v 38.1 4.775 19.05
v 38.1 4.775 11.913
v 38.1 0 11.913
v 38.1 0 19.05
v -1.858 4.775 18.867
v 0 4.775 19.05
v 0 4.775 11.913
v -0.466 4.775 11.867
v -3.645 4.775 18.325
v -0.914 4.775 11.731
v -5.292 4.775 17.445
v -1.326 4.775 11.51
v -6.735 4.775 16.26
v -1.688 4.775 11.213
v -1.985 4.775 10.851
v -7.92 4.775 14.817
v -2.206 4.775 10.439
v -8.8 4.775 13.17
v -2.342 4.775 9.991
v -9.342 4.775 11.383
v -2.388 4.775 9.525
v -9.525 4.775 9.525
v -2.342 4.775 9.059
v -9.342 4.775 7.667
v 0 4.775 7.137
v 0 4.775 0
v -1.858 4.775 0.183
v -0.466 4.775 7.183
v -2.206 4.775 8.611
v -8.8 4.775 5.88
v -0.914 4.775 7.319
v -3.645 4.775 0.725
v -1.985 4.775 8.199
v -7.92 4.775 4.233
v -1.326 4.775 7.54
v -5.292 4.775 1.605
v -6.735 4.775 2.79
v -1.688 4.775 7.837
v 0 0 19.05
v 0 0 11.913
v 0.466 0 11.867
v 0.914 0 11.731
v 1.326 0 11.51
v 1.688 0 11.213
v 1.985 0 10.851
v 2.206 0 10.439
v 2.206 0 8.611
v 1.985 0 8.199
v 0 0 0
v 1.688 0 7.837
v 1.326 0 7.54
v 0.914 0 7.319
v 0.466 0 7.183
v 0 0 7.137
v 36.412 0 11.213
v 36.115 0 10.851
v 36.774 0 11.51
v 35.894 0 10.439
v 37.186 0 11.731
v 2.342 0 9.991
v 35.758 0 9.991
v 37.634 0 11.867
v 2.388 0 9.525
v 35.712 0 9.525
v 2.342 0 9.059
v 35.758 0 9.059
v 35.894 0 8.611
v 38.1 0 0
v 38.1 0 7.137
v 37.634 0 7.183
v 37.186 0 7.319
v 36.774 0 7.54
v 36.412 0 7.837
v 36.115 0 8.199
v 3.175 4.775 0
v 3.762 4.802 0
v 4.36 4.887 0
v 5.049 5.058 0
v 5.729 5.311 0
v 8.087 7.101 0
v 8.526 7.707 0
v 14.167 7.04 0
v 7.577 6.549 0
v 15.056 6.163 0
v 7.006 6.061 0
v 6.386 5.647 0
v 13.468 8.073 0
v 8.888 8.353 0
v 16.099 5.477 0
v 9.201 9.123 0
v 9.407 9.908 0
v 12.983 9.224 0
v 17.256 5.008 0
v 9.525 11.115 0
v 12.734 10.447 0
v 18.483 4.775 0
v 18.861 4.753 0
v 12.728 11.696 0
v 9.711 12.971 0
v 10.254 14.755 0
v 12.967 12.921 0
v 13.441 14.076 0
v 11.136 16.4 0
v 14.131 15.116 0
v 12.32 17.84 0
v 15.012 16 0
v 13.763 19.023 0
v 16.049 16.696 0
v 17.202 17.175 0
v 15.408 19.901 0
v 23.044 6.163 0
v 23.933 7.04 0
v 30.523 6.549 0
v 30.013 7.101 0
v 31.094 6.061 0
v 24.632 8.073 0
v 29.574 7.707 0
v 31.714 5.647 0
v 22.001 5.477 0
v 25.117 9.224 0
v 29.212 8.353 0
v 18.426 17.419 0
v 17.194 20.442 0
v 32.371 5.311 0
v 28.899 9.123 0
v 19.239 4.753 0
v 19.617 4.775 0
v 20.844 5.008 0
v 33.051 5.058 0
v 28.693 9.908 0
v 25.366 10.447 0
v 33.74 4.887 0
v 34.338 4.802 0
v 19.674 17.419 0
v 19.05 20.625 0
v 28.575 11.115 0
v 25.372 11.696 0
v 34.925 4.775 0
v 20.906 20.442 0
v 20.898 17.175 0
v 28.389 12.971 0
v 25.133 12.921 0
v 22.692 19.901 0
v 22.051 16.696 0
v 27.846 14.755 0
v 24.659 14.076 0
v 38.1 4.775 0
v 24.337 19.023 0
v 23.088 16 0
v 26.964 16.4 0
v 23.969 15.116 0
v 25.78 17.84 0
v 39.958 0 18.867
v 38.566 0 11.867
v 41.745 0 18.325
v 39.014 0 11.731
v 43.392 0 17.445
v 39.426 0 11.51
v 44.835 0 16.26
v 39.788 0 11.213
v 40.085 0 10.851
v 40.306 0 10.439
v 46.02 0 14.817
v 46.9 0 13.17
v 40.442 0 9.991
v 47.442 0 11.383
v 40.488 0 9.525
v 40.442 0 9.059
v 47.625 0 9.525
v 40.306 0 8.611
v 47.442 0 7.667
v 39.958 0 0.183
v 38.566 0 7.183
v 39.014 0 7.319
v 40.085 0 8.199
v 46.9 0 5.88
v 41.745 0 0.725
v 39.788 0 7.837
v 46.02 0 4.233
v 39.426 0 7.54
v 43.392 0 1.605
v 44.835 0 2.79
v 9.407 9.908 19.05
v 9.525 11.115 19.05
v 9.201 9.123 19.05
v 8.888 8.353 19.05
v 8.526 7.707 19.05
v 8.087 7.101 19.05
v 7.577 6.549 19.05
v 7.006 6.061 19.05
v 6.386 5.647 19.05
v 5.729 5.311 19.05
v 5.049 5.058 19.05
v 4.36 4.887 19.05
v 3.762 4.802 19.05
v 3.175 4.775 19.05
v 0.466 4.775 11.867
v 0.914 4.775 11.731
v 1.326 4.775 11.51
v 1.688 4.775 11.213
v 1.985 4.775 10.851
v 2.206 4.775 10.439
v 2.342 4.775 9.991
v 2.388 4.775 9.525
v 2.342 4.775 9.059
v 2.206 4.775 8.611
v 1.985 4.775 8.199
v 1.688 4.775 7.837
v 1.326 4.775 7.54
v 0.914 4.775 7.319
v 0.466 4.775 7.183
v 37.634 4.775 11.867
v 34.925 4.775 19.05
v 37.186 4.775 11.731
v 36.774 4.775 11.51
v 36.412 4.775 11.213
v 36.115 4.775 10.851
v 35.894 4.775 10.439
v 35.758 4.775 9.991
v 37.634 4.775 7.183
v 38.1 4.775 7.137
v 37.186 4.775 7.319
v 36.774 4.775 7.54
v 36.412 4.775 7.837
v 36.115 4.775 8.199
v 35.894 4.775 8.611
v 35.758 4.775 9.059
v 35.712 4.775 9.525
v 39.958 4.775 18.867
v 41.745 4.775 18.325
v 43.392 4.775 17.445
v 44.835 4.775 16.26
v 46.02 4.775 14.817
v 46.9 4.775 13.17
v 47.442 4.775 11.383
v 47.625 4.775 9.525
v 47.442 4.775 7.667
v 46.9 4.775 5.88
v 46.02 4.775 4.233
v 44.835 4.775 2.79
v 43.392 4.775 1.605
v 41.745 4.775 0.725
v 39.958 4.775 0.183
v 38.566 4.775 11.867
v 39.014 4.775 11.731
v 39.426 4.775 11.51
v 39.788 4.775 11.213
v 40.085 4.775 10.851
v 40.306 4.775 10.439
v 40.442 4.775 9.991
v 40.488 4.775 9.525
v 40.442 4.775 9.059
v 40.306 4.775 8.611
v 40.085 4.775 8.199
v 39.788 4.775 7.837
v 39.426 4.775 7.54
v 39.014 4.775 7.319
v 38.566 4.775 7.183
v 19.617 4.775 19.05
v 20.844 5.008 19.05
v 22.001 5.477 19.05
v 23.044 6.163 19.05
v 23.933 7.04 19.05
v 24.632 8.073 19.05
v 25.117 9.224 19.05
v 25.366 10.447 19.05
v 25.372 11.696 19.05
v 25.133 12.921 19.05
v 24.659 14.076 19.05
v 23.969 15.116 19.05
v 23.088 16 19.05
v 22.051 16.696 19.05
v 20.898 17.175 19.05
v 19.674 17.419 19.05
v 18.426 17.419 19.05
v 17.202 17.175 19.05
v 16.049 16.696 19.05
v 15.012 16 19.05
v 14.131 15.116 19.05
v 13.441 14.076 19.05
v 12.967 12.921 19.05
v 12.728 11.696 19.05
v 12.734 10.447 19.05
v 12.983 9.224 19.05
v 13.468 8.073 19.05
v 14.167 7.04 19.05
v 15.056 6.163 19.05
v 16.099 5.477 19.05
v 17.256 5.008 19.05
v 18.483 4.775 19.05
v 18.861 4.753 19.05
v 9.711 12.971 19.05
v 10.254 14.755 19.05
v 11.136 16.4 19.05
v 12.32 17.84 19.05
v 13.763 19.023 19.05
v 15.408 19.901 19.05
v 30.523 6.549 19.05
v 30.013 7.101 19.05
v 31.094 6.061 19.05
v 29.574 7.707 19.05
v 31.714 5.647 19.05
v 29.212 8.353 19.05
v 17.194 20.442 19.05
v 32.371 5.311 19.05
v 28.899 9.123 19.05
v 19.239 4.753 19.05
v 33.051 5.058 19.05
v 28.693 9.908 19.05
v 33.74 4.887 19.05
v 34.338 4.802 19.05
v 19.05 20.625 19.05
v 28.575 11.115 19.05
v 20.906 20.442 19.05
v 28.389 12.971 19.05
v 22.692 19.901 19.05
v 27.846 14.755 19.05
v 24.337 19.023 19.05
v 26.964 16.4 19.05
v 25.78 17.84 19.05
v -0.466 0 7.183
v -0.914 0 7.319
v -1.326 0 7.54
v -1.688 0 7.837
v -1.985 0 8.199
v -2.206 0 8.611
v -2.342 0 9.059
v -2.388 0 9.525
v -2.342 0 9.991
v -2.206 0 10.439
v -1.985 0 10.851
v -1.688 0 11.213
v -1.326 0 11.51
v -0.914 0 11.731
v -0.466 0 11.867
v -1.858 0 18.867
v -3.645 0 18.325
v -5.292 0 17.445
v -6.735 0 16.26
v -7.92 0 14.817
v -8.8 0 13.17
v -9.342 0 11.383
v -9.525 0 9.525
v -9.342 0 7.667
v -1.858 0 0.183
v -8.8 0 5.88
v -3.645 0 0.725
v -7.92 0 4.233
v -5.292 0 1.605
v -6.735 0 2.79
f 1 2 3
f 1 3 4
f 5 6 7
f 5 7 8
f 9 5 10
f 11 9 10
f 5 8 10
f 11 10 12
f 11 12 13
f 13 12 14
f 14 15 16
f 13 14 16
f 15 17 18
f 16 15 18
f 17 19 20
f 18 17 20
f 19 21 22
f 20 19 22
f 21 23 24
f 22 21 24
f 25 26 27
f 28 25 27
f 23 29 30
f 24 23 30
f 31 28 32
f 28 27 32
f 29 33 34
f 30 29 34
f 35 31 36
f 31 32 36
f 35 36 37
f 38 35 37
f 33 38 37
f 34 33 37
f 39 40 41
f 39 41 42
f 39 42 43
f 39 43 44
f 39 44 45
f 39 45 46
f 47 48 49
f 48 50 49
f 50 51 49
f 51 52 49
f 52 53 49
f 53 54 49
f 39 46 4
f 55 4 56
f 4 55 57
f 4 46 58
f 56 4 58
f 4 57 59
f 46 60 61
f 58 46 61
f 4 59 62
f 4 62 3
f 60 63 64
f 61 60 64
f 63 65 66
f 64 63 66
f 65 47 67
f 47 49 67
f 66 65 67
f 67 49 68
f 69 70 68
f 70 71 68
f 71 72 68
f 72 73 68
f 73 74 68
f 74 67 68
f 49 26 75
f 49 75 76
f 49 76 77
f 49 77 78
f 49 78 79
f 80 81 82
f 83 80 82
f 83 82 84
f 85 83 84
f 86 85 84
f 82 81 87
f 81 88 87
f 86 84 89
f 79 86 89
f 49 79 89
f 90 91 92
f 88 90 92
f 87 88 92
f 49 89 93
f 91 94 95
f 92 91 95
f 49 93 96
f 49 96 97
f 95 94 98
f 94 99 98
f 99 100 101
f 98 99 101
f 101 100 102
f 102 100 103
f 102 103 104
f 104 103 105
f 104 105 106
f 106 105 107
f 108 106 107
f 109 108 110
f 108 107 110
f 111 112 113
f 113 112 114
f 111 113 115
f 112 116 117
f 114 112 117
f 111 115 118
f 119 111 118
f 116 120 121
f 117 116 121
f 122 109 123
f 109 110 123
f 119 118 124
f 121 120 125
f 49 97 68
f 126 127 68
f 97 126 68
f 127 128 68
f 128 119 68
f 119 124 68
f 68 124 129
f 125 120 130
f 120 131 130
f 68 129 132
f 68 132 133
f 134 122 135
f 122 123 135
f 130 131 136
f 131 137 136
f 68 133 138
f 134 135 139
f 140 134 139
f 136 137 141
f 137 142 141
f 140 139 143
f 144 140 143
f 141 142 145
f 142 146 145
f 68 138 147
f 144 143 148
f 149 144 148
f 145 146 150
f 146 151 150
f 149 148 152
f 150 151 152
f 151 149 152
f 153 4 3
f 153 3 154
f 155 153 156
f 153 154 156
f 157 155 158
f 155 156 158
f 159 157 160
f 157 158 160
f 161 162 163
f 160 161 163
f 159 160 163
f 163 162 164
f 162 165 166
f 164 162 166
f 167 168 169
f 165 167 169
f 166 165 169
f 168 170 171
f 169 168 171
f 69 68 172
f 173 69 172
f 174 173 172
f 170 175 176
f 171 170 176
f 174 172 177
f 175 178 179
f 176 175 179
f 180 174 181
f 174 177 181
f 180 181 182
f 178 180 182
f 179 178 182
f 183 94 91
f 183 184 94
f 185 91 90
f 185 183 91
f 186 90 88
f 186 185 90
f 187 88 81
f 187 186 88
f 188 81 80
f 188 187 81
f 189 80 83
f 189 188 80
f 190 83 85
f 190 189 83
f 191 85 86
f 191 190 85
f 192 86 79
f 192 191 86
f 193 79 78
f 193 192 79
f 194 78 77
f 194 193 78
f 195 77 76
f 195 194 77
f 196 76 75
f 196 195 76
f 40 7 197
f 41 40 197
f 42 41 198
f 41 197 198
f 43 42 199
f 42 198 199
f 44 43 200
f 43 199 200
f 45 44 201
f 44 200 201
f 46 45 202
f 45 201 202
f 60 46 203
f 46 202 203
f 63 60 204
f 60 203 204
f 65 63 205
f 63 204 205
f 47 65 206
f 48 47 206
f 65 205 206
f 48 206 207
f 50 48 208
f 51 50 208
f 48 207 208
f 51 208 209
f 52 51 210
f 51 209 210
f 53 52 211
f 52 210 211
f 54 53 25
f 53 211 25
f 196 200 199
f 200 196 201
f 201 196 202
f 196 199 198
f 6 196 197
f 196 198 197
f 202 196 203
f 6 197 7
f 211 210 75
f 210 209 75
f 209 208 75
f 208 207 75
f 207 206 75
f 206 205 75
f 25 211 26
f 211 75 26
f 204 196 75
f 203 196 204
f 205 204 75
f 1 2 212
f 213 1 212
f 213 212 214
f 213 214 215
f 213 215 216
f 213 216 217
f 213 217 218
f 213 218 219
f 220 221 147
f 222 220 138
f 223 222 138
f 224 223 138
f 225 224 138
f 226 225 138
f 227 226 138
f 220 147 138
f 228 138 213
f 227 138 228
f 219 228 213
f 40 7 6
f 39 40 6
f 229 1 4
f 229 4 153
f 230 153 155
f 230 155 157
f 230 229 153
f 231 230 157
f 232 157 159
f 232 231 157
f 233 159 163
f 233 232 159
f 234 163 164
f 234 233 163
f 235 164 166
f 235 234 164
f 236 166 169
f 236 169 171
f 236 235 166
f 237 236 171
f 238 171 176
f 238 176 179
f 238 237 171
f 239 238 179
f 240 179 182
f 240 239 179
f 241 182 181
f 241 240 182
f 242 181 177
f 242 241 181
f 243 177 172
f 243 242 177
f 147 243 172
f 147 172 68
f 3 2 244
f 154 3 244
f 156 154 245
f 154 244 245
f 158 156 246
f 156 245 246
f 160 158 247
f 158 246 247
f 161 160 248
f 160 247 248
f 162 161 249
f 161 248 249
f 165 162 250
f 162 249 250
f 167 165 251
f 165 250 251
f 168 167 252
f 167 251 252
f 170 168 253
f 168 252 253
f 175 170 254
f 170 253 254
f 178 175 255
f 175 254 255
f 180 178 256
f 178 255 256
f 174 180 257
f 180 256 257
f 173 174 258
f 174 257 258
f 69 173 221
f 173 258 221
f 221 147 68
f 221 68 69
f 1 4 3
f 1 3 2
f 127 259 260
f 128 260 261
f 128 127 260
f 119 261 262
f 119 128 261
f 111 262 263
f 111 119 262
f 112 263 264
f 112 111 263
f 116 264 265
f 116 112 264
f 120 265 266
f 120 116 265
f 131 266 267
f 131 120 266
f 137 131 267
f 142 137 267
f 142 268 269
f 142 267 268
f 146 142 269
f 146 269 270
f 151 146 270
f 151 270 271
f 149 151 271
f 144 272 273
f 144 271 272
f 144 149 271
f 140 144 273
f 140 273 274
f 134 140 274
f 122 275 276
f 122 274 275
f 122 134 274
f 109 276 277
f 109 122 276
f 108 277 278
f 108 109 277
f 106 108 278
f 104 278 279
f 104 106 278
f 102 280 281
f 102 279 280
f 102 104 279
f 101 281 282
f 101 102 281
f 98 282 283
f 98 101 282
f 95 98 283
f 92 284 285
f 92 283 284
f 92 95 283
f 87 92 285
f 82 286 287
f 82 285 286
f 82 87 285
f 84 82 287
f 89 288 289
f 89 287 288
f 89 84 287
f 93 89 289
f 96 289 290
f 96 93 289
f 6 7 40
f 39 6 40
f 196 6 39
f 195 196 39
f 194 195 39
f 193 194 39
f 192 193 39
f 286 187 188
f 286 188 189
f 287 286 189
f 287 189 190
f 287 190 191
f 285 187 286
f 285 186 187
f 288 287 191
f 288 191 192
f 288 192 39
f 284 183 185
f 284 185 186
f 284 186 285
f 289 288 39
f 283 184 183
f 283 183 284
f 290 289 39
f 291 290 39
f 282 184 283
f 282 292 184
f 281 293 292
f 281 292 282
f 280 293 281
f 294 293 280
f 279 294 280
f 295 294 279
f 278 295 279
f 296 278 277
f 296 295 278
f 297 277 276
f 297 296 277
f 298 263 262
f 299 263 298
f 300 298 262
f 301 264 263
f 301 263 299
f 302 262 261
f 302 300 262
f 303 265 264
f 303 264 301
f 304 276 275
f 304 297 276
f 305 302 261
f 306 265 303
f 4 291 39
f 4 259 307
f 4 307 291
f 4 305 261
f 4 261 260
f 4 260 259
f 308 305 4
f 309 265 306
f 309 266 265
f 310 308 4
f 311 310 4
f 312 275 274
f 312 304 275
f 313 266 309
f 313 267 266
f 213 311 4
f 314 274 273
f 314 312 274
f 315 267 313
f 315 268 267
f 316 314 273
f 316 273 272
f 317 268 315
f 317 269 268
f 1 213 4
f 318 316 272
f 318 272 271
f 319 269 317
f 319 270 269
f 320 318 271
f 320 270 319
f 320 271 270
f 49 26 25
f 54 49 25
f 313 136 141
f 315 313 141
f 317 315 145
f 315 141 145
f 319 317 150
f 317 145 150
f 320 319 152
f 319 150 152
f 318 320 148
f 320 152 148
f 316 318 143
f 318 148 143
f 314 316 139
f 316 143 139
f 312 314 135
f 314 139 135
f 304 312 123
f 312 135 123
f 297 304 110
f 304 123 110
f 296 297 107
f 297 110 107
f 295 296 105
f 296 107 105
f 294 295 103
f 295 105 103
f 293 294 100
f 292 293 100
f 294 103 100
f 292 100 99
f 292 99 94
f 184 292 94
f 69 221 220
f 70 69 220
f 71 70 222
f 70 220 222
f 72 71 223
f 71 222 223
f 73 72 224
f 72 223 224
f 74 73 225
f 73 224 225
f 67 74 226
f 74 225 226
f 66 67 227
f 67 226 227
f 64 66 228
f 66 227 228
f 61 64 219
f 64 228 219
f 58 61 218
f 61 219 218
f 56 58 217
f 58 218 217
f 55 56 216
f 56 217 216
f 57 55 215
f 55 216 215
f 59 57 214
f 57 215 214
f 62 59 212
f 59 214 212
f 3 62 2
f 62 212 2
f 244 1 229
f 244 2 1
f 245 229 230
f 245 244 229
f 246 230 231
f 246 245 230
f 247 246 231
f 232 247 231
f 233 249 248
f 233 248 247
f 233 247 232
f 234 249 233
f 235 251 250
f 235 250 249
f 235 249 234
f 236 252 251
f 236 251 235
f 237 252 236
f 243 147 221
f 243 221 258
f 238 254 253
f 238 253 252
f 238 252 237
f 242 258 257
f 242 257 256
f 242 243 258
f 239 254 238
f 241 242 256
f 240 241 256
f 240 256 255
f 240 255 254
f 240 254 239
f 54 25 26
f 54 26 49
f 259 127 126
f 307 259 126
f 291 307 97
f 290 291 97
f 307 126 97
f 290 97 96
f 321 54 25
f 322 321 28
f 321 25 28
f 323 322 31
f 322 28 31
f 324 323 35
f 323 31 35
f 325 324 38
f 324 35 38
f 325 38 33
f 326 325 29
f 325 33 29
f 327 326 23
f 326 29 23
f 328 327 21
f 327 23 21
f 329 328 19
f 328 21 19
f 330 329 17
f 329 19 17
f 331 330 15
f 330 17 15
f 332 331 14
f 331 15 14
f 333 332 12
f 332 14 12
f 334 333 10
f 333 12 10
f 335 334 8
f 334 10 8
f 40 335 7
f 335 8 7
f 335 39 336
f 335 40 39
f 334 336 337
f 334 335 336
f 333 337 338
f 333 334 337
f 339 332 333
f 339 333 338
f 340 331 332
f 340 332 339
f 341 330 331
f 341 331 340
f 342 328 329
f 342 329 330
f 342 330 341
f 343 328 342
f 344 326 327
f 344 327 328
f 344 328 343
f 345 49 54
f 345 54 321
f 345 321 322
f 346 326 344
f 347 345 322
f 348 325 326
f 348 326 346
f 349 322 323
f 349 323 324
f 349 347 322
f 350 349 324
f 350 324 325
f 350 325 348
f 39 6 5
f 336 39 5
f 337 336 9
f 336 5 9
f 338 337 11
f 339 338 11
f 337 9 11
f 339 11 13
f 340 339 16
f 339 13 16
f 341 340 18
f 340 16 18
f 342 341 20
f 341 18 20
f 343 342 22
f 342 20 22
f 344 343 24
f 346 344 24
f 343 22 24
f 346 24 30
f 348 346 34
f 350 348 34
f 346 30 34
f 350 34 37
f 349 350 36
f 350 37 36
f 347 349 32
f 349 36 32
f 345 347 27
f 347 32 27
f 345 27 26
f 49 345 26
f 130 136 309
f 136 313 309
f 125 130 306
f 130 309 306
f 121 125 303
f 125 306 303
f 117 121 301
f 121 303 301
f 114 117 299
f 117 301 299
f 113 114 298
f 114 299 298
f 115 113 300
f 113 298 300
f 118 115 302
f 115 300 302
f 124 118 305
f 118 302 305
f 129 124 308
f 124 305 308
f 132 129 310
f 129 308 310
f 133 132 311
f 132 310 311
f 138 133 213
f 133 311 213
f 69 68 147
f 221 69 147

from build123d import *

# Parameters (mm, degrees)
BOSS_EXTRUDE1_DEPTH   = 19.05
SKETCH1_3_R           = 6.35
CUT_EXTRUDE1_DEPTH    = 22.5044
BOSS_EXTRUDE2_DEPTH   = 4.7752
BOSS_EXTRUDE2_2_DEPTH = 4.7752
SKETCH3_R             = 2.3876
CUT_EXTRUDE2_DEPTH    = 54.686617934
FILLET1_R             = 6.35
FILLET2_R             = 6.35


with BuildPart() as part:
    # Sketch1 → Boss-Extrude1 (new body)
    with BuildSketch(Plane.XY):
        with BuildLine():
            Line((28.575, 4.7752), (28.575, 11.0998))
            ThreePointArc((28.575, 11.0998), (19.05, 20.6248), (9.525, 11.0998))
            Line((9.525, 11.0998), (9.525, 4.7752))
            Line((9.525, 4.7752), (0, 4.7752))
            Line((0, 4.7752), (0, 0))
            Line((0, 0), (38.1, 0))
            Line((38.1, 0), (38.1, 4.7752))
            Line((38.1, 4.7752), (28.575, 4.7752))
        make_face()
        with BuildLine():
            ThreePointArc((19.617393021, 4.7752), (19.05, 4.7498), (18.482606979, 4.7752))
            Line((18.482606979, 4.7752), (19.617393021, 4.7752))
        make_face(mode=Mode.SUBTRACT)
    extrude(amount=BOSS_EXTRUDE1_DEPTH)

    # Sketch1<3> → Cut-Extrude1 (cut)
    with BuildSketch(Plane.XY):
        with Locations((19.05, 11.0998)):
            Circle(SKETCH1_3_R)
    extrude(amount=CUT_EXTRUDE1_DEPTH, mode=Mode.SUBTRACT)


with BuildPart() as body_2:
    # Sketch2 → Boss-Extrude2 (new body)
    with BuildSketch(Plane(origin=(0, 4.7752, 0), x_dir=(1, 0, 0), z_dir=(0, 1, 0))):
        with BuildLine():
            Line((38.1, 0), (38.1, -19.05))
            ThreePointArc((38.1, -19.05), (47.625, -9.525), (38.1, 0))
        make_face()
    extrude(amount=-BOSS_EXTRUDE2_DEPTH)


with BuildPart() as body_3:
    # Sketch2 → Boss-Extrude2 2 (new body)
    with BuildSketch(Plane(origin=(0, 4.7752, 0), x_dir=(1, 0, 0), z_dir=(0, 1, 0))):
        with BuildLine():
            Line((0, 0), (0, -19.05))
            ThreePointArc((0, -19.05), (-9.525, -9.525), (0, 0))
        make_face()
    extrude(amount=-BOSS_EXTRUDE2_2_DEPTH)


with BuildPart() as cut_extrude2_tool:
    # Sketch3 → Cut-Extrude2 (new, through all)
    with BuildSketch(Plane(origin=(0, 4.7752, 0), x_dir=(1, 0, 0), z_dir=(0, 1, 0))):
        with Locations((38.1, -9.525)):
            Circle(SKETCH3_R)
        with Locations((0, -9.525)):
            Circle(SKETCH3_R)
    extrude(amount=-CUT_EXTRUDE2_DEPTH)


with BuildPart() as part_1:
    add(part.part)

    # Cut-Extrude2: cut by cut_extrude2_tool
    add(cut_extrude2_tool.part, mode=Mode.SUBTRACT)

    # Fillet1
    fillet1_edges = [part_1.edges().sort_by_distance(p)[0] for p in [
        (28.575, 4.7752, 9.525),
    ]]
    fillet(fillet1_edges, radius=FILLET1_R)

    # Fillet2
    fillet2_edges = [part_1.edges().sort_by_distance(p)[0] for p in [
        (9.525, 4.7752, 9.525),
    ]]
    fillet(fillet2_edges, radius=FILLET2_R)


with BuildPart() as body_2_1:
    add(body_2.part)

    # Cut-Extrude2: cut by cut_extrude2_tool
    add(cut_extrude2_tool.part, mode=Mode.SUBTRACT)


with BuildPart() as body_3_1:
    add(body_3.part)

    # Cut-Extrude2: cut by cut_extrude2_tool
    add(cut_extrude2_tool.part, mode=Mode.SUBTRACT)


solid = Compound([part_1.part, body_2_1.part, body_3_1.part])
